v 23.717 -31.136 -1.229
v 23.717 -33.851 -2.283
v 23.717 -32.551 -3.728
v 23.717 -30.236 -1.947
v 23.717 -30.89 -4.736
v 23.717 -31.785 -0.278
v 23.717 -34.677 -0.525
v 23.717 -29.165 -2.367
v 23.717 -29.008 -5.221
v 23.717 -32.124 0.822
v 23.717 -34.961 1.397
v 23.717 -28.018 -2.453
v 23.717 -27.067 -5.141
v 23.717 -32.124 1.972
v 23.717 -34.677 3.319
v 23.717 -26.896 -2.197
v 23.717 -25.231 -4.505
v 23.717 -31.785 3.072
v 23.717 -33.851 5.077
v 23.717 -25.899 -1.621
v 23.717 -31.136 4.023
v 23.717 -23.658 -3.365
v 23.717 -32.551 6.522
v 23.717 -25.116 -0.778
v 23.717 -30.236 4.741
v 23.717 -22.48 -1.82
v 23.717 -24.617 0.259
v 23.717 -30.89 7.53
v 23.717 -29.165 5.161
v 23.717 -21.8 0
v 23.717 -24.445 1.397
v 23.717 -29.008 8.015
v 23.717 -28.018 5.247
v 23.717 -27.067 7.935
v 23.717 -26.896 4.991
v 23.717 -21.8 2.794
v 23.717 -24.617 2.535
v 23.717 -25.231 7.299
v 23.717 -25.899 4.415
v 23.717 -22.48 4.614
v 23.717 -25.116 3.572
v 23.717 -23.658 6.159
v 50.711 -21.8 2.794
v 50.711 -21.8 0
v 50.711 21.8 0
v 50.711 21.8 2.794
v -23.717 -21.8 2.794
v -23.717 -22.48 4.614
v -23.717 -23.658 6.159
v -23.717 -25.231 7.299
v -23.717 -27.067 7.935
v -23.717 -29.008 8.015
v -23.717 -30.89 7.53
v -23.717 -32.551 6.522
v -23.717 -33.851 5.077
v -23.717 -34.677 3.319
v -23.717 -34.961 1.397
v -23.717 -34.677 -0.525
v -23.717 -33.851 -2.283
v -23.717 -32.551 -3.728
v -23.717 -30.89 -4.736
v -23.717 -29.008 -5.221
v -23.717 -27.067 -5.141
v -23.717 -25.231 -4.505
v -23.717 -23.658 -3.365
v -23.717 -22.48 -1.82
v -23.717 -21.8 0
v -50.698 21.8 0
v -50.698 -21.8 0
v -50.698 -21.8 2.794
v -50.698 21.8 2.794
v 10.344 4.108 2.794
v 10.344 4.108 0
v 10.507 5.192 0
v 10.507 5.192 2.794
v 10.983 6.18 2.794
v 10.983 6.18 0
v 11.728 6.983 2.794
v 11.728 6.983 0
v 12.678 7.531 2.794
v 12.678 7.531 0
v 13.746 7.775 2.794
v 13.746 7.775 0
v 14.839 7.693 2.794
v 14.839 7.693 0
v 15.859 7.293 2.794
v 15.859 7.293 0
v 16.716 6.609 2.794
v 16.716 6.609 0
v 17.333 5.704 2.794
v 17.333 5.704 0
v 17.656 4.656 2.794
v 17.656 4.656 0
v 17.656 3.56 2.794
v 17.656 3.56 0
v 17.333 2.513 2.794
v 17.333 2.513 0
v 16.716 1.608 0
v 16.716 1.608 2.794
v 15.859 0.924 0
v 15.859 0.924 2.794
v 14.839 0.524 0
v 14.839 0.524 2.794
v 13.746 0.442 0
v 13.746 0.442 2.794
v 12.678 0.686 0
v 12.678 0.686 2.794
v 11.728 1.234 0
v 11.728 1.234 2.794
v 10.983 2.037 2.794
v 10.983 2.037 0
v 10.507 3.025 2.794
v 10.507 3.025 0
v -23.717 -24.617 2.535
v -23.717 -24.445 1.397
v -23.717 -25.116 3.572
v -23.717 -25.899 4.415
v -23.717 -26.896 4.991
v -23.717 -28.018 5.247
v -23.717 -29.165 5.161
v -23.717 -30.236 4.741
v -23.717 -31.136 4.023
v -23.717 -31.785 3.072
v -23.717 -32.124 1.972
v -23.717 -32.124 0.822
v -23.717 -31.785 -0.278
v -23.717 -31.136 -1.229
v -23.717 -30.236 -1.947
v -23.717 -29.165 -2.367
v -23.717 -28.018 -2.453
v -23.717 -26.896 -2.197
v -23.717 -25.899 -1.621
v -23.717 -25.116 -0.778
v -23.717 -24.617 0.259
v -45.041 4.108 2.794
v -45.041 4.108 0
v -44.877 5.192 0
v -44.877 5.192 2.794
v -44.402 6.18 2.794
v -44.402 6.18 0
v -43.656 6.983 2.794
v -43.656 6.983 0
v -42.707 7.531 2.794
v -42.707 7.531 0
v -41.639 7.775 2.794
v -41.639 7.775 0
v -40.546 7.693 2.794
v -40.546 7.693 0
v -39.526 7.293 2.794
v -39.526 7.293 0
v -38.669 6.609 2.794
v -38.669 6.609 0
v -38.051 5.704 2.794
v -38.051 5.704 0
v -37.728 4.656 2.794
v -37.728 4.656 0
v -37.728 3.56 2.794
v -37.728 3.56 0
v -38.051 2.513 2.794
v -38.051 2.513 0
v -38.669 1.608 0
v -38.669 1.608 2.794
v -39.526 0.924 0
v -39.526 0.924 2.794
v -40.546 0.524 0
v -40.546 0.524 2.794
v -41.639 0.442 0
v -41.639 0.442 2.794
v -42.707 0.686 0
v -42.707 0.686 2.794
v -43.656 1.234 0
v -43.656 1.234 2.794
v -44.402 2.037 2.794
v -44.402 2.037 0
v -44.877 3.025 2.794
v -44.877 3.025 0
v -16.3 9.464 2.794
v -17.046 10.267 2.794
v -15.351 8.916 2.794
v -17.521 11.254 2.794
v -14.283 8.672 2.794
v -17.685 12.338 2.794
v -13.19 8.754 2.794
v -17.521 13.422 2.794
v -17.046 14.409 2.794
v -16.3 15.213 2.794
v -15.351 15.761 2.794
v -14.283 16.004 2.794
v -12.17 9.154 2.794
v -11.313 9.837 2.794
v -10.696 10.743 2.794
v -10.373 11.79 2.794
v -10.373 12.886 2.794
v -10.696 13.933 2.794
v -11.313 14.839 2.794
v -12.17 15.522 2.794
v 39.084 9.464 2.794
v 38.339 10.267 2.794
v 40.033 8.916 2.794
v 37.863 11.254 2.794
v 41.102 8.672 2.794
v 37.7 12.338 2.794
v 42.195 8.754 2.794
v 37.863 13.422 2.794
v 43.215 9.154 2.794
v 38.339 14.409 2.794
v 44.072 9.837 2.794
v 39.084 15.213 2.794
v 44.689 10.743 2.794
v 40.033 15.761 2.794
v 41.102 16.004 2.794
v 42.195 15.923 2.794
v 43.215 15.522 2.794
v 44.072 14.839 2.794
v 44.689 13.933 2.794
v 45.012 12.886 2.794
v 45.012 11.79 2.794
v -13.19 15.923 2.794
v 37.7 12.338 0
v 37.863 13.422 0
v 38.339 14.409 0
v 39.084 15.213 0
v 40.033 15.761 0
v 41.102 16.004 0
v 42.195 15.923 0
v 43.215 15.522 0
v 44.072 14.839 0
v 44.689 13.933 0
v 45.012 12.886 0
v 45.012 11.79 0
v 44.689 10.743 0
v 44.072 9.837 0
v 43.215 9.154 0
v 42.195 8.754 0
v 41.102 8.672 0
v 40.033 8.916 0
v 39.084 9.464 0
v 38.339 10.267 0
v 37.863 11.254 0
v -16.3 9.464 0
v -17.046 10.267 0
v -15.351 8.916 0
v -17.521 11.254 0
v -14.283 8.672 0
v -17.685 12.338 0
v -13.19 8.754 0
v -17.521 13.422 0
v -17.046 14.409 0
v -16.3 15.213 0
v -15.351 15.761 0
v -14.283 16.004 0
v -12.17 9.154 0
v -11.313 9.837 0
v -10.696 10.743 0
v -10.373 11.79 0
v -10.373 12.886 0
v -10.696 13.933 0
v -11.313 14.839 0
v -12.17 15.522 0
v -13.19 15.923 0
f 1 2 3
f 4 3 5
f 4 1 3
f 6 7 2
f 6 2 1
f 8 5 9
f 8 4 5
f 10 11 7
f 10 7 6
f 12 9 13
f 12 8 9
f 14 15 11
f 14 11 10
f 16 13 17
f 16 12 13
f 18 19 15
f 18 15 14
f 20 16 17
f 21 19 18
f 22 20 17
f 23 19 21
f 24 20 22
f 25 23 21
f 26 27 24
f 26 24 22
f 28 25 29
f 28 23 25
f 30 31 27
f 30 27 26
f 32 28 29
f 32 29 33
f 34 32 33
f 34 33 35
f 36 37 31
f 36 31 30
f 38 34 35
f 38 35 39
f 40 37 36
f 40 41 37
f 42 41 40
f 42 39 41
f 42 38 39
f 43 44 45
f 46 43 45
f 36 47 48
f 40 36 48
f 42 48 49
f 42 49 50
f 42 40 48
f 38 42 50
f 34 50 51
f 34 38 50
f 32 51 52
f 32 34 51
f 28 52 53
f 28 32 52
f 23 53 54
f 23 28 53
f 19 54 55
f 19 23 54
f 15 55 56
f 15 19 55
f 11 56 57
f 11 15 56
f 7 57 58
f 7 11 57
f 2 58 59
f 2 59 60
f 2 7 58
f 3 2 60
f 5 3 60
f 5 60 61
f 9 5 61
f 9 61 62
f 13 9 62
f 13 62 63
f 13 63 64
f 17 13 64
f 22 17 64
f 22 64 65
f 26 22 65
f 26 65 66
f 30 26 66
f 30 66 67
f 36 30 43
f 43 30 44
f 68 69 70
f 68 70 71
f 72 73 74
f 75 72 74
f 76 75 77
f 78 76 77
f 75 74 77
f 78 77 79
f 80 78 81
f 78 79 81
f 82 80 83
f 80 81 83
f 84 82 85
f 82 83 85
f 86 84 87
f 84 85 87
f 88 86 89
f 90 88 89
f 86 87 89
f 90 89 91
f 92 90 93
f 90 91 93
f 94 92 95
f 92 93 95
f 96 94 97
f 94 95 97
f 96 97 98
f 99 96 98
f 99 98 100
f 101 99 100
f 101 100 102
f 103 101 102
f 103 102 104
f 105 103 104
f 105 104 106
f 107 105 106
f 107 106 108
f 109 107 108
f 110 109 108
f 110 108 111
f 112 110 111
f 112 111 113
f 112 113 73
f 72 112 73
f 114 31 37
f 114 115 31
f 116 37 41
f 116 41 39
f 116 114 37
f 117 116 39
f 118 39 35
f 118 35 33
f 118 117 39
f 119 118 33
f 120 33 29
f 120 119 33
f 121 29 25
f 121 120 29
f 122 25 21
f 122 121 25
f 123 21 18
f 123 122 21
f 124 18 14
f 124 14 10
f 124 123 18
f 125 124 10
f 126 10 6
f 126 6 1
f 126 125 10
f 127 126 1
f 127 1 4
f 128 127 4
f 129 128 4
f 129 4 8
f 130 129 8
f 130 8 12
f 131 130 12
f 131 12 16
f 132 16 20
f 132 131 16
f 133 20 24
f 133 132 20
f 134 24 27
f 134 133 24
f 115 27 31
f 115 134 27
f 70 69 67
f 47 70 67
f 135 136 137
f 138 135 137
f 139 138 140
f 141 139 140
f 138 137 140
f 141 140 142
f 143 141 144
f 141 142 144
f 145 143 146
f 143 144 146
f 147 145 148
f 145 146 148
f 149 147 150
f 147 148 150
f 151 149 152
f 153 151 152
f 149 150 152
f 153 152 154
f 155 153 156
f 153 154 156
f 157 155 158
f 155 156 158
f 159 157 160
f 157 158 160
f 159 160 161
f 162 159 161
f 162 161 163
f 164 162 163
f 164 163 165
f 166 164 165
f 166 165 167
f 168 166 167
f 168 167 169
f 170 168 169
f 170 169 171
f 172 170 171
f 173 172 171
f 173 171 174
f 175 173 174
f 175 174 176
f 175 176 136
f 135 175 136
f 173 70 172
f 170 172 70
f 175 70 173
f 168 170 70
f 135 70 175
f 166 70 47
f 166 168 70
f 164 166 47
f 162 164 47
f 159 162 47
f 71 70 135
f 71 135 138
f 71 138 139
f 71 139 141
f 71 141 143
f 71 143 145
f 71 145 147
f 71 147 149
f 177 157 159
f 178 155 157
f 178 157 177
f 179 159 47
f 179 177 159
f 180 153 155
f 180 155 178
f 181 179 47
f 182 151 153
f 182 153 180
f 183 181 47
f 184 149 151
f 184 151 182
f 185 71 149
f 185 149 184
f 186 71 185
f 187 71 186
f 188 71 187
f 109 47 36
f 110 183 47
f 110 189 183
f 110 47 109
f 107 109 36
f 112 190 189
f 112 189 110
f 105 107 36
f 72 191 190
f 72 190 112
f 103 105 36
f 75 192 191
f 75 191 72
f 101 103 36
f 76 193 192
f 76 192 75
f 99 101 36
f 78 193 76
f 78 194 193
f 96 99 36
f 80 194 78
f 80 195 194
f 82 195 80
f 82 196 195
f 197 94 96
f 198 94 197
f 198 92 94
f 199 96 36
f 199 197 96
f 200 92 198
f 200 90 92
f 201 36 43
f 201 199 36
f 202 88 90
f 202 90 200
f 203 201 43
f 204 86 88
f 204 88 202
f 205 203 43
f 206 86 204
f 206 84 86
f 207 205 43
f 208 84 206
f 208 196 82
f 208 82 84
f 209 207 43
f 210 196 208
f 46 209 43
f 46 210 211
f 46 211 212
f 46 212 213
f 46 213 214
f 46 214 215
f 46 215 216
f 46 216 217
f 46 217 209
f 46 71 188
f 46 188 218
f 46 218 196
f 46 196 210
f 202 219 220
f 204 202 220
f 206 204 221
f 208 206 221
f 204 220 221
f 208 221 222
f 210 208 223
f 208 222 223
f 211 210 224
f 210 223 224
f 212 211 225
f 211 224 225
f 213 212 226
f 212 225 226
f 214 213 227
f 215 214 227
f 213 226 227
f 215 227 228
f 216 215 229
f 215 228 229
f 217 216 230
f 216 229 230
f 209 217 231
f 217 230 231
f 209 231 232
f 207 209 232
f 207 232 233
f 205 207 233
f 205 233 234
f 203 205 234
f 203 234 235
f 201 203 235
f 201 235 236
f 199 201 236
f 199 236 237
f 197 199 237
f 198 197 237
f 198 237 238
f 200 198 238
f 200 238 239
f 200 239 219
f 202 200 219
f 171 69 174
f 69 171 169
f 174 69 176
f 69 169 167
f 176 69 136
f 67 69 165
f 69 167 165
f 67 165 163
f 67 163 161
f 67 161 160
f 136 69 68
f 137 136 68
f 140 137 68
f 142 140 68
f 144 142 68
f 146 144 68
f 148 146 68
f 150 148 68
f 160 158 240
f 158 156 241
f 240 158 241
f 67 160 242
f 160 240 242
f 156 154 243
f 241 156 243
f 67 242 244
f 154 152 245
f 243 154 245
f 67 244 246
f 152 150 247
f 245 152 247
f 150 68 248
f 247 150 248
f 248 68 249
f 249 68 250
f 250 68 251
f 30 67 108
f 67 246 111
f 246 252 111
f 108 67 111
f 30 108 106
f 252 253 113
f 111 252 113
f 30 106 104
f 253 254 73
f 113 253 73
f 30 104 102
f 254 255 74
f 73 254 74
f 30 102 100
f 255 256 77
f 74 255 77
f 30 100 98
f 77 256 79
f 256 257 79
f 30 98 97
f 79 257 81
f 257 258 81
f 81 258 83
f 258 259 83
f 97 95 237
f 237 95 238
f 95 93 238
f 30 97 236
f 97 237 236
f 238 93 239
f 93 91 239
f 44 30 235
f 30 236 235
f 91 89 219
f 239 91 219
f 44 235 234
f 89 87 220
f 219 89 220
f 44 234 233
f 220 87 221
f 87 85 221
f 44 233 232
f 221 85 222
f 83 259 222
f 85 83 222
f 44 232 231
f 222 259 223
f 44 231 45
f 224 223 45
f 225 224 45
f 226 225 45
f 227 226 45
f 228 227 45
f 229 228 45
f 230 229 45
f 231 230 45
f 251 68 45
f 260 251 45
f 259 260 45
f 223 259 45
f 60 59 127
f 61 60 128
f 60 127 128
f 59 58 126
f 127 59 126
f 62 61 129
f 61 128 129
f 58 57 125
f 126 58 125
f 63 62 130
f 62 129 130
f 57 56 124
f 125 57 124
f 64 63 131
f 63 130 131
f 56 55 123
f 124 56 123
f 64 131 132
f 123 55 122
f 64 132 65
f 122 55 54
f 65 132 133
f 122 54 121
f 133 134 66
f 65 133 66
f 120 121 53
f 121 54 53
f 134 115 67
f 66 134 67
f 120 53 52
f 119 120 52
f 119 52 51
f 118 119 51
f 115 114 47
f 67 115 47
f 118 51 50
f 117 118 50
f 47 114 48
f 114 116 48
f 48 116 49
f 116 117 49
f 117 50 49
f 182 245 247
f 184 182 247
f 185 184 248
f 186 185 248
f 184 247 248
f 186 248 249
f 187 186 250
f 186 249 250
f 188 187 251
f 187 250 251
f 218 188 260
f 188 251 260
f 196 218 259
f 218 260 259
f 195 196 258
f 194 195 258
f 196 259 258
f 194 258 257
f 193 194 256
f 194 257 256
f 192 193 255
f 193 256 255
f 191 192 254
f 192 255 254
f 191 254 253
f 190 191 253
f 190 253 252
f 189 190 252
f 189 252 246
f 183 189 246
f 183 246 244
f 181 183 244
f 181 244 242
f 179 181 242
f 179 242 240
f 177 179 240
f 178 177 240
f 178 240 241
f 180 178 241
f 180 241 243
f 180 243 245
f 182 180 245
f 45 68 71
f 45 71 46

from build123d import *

# Parameters (mm, degrees)
F0_W          = 101.4095
F0_H          = 43.5991
F1_DEPTH      = 2.794
F2_R          = 6.6548
F2_R_2        = 3.8608
F3_DEPTH      = 23.71725
F3_DEPTH_BACK = 23.71725
F5_D          = 7.3533
F5_DEPTH      = 12.7


with BuildPart() as f1:
    # F0 (on Top) → F1 (new body)
    with BuildSketch(Plane.XY):
        with Locations((0.00635, 0)):
            Rectangle(F0_W, F0_H)
    extrude(amount=F1_DEPTH)

    # F2 (on Right) → F3 (join, two sides)
    with BuildSketch(Plane.YZ) as f3_sk:
        with Locations((-28.306066, 1.397)):
            Circle(F2_R)
        with Locations((-28.306066, 1.397)):
            Circle(F2_R_2, mode=Mode.SUBTRACT)
    extrude(amount=F3_DEPTH)
    extrude(f3_sk.sketch, amount=-F3_DEPTH_BACK)

    # F5
    with Locations(Plane.XY.offset(2.794)):
        with Locations((14.0208, 4.10845), (-14.0081, 12.33805), (-41.3639, 4.10845), (41.3766, 12.33805)):
            Hole(F5_D / 2, depth=F5_DEPTH)


solid = f1.part
